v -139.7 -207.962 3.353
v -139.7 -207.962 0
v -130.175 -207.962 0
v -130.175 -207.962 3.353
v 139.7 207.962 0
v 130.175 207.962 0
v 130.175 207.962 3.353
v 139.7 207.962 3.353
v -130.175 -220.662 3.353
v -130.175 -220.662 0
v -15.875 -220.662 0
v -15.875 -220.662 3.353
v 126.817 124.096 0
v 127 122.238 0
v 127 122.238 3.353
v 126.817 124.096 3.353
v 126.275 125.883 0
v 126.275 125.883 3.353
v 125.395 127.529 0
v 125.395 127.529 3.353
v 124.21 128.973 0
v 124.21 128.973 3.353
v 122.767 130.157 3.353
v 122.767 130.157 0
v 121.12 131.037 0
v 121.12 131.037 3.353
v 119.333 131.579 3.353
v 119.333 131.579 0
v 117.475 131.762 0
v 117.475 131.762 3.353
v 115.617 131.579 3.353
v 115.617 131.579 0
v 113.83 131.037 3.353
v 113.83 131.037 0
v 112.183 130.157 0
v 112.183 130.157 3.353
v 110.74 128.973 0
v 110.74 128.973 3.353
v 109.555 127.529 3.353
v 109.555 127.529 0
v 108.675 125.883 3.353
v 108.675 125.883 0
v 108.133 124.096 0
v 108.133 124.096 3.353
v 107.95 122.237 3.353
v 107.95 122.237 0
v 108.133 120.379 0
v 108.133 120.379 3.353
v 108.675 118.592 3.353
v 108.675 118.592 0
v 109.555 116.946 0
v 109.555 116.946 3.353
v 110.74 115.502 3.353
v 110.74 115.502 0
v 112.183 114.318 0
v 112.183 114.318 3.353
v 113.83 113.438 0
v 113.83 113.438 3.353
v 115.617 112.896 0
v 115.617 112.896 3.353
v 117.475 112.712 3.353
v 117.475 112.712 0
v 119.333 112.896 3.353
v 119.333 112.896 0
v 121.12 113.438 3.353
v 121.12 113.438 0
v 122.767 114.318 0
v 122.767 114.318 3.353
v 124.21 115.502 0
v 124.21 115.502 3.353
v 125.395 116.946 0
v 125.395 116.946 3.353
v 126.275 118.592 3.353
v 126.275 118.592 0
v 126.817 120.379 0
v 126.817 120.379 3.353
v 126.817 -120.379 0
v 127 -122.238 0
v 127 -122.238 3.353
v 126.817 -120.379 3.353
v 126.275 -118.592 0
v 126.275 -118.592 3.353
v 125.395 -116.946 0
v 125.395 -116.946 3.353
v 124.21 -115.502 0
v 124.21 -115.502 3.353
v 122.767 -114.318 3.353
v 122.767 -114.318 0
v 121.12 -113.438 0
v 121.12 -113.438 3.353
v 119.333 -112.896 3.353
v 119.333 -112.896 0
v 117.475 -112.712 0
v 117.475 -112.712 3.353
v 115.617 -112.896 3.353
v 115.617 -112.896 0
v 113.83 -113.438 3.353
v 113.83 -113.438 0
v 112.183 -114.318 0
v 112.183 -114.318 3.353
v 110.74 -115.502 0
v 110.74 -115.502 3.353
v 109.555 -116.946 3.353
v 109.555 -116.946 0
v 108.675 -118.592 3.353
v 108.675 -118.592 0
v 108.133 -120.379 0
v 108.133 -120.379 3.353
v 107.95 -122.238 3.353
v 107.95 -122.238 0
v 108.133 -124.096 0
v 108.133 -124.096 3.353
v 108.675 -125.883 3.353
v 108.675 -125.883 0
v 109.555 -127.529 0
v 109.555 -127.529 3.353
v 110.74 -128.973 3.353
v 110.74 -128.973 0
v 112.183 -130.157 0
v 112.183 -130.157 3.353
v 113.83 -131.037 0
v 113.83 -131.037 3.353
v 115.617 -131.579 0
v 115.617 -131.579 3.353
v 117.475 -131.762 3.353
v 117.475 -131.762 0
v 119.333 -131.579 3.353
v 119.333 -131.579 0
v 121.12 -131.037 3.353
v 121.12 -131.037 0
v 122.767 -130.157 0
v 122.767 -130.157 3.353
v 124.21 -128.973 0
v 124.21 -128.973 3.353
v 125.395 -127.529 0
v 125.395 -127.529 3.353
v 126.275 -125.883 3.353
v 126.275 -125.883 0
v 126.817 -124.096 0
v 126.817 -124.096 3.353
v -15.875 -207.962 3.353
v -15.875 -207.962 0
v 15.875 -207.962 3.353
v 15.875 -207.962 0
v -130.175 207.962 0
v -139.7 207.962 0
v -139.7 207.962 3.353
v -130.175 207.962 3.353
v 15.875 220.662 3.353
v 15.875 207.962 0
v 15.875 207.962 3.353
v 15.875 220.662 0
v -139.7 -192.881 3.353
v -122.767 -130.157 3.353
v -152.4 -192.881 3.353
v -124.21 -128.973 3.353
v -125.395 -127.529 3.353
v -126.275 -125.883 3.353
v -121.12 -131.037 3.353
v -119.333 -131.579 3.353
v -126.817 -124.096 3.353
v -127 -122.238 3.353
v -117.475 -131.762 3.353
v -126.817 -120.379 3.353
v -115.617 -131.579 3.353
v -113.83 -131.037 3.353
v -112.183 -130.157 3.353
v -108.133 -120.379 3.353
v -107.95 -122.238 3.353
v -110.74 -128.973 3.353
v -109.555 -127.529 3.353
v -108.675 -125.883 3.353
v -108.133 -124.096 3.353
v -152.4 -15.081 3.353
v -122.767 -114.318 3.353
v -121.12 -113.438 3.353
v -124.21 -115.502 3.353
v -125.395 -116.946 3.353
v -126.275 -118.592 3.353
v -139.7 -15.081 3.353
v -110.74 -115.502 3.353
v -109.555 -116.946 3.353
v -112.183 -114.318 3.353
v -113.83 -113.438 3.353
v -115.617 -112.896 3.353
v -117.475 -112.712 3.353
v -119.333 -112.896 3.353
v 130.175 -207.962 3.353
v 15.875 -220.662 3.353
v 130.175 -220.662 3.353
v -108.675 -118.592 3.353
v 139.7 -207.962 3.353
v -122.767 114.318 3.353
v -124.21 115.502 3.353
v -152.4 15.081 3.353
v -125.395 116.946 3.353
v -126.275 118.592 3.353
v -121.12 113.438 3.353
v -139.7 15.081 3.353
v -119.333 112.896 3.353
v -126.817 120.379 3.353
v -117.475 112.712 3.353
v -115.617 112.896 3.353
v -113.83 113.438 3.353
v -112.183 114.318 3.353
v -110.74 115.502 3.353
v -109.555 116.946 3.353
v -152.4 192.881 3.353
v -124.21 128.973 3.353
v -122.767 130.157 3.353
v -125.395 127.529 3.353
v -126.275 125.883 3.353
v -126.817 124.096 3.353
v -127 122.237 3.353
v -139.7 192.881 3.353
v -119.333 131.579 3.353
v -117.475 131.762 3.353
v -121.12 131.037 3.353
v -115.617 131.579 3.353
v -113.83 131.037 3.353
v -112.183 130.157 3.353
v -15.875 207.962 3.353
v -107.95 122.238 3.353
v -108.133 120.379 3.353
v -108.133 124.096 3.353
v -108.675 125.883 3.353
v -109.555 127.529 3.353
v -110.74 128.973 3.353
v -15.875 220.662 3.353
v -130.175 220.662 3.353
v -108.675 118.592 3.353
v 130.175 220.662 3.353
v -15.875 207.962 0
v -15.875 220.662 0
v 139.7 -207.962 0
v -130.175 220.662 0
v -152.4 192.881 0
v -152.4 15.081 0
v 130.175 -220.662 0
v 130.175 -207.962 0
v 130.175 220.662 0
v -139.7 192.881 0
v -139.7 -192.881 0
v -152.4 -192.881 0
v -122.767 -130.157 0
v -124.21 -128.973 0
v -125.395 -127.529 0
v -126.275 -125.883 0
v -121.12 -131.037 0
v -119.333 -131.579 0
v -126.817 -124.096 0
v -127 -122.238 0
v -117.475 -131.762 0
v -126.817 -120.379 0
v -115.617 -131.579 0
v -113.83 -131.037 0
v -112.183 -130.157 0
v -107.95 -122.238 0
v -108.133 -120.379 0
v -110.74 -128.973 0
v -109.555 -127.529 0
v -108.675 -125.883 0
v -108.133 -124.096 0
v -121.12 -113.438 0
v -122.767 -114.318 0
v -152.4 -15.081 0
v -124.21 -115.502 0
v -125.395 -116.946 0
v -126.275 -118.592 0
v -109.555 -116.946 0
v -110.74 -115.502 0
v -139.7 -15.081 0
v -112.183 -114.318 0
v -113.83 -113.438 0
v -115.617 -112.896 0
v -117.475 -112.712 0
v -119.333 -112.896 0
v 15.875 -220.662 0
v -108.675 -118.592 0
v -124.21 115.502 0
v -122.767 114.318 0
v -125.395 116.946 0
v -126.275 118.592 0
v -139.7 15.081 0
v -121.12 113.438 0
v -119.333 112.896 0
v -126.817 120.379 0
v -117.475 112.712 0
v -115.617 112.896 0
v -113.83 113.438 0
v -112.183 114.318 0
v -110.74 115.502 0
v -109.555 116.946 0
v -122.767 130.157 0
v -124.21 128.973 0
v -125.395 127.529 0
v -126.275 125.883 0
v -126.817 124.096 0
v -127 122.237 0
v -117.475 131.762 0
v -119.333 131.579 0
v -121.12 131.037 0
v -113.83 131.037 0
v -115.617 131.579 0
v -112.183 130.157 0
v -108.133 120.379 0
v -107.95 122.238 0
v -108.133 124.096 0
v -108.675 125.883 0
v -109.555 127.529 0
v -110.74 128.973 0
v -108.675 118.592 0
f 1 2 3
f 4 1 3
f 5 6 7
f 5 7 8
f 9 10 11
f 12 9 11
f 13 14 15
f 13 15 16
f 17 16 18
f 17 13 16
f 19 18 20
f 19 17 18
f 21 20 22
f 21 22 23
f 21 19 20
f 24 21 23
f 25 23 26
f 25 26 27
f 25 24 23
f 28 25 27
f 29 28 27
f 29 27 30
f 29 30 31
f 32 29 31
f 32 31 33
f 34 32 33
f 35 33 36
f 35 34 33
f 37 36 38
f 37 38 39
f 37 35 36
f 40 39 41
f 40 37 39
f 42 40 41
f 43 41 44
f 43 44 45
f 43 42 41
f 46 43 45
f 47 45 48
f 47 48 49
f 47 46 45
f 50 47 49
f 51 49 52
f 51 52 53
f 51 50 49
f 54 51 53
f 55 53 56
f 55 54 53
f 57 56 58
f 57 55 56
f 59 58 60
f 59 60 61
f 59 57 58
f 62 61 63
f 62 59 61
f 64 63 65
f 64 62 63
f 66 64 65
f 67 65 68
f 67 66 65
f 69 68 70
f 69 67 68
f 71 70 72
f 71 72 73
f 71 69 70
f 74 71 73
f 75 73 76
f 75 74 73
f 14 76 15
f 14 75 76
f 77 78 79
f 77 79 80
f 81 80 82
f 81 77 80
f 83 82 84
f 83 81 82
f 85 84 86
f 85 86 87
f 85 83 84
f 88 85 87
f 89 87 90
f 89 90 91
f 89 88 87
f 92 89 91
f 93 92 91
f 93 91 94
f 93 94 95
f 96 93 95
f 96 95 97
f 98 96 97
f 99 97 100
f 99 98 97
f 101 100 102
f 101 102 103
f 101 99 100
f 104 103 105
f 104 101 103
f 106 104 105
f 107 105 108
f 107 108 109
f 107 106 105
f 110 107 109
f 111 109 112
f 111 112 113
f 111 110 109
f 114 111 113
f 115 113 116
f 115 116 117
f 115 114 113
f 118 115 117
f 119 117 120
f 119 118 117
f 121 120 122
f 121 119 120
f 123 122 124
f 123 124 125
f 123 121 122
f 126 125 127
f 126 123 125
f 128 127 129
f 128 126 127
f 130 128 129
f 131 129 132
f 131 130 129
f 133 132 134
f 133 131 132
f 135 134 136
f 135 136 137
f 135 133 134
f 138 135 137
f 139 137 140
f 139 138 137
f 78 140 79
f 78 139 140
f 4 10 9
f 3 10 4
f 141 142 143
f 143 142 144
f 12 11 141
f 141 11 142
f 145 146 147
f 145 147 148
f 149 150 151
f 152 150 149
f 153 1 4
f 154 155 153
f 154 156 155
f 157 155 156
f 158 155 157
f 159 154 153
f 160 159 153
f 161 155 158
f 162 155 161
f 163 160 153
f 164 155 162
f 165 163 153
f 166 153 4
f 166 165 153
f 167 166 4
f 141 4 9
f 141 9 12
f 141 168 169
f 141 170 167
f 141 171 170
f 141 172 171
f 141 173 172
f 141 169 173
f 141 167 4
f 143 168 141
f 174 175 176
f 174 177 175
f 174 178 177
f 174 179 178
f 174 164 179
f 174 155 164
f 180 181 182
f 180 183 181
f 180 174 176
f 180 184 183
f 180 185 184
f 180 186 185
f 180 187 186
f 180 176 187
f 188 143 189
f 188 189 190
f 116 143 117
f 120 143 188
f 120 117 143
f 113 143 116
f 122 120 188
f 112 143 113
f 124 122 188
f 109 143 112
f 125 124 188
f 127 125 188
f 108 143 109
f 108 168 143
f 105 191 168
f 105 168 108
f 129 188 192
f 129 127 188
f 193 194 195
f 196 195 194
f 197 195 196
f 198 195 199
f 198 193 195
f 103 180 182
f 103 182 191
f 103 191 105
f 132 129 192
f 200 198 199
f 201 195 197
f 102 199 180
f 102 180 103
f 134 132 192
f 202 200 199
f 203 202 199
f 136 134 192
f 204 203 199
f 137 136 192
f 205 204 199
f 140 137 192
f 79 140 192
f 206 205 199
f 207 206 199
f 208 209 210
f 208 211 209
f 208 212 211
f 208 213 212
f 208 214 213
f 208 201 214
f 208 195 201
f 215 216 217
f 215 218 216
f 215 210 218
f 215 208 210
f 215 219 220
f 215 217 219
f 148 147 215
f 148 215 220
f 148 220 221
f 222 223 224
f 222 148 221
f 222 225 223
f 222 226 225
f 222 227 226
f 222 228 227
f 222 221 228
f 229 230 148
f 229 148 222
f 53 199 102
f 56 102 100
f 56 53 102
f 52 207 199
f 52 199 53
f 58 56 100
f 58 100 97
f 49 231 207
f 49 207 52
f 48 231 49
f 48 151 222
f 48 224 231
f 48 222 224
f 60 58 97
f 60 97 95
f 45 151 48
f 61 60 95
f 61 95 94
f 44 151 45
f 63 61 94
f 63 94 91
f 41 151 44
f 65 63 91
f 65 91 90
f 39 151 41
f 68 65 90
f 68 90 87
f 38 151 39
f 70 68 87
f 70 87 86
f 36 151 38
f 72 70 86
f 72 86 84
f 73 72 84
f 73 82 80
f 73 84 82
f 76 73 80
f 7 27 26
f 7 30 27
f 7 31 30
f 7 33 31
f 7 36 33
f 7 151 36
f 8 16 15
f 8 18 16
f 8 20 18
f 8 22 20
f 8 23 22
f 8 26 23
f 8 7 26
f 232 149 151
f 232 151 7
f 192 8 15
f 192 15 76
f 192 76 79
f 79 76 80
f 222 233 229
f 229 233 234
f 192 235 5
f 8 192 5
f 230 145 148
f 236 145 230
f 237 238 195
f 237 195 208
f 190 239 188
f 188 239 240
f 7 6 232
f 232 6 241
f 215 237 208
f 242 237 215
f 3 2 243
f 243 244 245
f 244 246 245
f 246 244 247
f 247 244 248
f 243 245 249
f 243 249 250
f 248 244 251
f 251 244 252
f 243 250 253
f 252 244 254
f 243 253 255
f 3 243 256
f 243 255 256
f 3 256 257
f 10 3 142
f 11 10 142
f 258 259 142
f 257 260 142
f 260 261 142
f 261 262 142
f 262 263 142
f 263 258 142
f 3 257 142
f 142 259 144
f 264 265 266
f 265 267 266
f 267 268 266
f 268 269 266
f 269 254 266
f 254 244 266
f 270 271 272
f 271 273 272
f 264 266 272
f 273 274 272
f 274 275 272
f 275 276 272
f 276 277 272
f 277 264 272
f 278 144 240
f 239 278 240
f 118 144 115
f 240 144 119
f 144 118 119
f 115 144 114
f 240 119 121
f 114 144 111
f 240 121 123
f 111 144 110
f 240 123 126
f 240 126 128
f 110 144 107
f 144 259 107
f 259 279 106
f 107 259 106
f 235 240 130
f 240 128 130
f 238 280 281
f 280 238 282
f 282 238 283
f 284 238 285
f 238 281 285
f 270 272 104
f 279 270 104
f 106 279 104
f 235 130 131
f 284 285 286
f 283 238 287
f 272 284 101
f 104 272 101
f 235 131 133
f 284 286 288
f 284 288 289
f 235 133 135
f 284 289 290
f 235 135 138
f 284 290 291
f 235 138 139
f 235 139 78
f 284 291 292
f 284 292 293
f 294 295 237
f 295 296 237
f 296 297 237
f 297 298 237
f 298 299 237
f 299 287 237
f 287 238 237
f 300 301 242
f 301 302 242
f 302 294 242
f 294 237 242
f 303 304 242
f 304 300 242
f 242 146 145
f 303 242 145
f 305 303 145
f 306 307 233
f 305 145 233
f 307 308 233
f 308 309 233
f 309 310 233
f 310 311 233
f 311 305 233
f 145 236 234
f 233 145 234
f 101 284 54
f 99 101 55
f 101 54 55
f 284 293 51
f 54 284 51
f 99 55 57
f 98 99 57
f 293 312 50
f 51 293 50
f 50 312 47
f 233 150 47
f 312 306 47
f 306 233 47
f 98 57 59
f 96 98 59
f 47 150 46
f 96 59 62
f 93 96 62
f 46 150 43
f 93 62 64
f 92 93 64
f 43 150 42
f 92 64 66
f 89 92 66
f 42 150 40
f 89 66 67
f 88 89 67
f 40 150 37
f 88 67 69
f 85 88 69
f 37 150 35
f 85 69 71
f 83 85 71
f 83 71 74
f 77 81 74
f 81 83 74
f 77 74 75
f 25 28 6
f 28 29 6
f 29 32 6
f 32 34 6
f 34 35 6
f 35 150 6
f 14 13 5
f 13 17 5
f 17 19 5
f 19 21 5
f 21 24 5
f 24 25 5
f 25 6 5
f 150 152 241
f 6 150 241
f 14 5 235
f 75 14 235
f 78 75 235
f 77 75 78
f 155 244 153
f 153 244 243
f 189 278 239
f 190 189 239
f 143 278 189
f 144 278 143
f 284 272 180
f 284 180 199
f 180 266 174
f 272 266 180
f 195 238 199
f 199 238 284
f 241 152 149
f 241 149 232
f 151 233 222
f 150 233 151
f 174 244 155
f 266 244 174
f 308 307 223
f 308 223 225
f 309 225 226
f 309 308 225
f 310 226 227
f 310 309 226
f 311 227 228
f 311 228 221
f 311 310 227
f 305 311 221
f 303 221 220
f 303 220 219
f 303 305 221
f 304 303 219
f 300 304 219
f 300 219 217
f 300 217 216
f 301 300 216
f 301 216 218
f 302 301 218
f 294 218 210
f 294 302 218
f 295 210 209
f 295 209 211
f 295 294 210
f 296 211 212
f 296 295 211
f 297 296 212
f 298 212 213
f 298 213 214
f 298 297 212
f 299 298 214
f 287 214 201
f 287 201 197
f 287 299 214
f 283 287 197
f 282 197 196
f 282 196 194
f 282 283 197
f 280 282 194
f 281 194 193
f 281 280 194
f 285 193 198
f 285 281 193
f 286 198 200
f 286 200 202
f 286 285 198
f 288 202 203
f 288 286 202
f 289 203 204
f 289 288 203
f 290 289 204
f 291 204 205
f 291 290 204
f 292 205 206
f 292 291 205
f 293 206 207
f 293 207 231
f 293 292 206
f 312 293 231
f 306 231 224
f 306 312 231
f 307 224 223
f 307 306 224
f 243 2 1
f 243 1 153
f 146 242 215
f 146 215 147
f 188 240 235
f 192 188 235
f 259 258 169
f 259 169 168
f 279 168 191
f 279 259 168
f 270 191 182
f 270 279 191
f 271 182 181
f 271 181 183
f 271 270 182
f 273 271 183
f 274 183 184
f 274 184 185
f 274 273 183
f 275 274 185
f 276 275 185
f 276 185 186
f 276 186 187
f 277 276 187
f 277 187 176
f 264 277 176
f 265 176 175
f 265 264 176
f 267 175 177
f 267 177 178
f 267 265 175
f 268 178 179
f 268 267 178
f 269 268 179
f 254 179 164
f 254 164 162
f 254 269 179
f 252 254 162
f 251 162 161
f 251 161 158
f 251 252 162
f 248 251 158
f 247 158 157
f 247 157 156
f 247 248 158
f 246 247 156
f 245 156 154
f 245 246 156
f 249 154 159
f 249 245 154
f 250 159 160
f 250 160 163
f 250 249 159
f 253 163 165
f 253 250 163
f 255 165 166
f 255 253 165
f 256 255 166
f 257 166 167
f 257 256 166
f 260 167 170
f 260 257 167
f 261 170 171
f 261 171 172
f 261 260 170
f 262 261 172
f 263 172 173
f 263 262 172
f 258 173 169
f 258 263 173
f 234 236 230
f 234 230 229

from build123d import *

# Parameters (mm, degrees)
SKETCH1_W           = 279.4
SKETCH1_H           = 415.925
SKETCH1_R           = 9.525
SKETCH1_W_2         = 12.7
SKETCH1_H_2         = 177.8
SKETCH1_W_3         = 114.3
SKETCH1_H_3         = 12.7
BOSS_EXTRUDE3_DEPTH = 3.3528


with BuildPart() as part:
    # Sketch1 → Boss-Extrude3 (new body)
    # profile 1 of 7: a face of its own
    with BuildSketch(Plane.XY):
        Rectangle(SKETCH1_W, SKETCH1_H)
        with Locations((117.475, -122.2375)):
            Circle(SKETCH1_R, mode=Mode.SUBTRACT)
        with Locations((117.475, 122.2375)):
            Circle(SKETCH1_R, mode=Mode.SUBTRACT)
        with Locations((-117.475, -122.2375)):
            Circle(SKETCH1_R, mode=Mode.SUBTRACT)
        with Locations((-117.475, 122.2375)):
            Circle(SKETCH1_R, mode=Mode.SUBTRACT)
    # profile 2 of 7: a face of its own
    with BuildSketch(Plane.XY):
        with Locations((-146.05, 103.98125)):
            Rectangle(SKETCH1_W_2, SKETCH1_H_2)
    # profile 3 of 7: a face of its own
    with BuildSketch(Plane.XY):
        with Locations((-73.025, 214.3125)):
            Rectangle(SKETCH1_W_3, SKETCH1_H_3)
    # profile 4 of 7: a face of its own
    with BuildSketch(Plane.XY):
        with Locations((-146.05, -103.98125)):
            Rectangle(SKETCH1_W_2, SKETCH1_H_2)
    # profile 5 of 7: a face of its own
    with BuildSketch(Plane.XY):
        with Locations((73.025, 214.3125)):
            Rectangle(SKETCH1_W_3, SKETCH1_H_3)
    # profile 6 of 7: a face of its own
    with BuildSketch(Plane.XY):
        with Locations((-73.025, -214.3125)):
            Rectangle(SKETCH1_W_3, SKETCH1_H_3)
    # profile 7 of 7: a face of its own
    with BuildSketch(Plane.XY):
        with Locations((73.025, -214.3125)):
            Rectangle(SKETCH1_W_3, SKETCH1_H_3)
    extrude(amount=BOSS_EXTRUDE3_DEPTH)


solid = part.part
